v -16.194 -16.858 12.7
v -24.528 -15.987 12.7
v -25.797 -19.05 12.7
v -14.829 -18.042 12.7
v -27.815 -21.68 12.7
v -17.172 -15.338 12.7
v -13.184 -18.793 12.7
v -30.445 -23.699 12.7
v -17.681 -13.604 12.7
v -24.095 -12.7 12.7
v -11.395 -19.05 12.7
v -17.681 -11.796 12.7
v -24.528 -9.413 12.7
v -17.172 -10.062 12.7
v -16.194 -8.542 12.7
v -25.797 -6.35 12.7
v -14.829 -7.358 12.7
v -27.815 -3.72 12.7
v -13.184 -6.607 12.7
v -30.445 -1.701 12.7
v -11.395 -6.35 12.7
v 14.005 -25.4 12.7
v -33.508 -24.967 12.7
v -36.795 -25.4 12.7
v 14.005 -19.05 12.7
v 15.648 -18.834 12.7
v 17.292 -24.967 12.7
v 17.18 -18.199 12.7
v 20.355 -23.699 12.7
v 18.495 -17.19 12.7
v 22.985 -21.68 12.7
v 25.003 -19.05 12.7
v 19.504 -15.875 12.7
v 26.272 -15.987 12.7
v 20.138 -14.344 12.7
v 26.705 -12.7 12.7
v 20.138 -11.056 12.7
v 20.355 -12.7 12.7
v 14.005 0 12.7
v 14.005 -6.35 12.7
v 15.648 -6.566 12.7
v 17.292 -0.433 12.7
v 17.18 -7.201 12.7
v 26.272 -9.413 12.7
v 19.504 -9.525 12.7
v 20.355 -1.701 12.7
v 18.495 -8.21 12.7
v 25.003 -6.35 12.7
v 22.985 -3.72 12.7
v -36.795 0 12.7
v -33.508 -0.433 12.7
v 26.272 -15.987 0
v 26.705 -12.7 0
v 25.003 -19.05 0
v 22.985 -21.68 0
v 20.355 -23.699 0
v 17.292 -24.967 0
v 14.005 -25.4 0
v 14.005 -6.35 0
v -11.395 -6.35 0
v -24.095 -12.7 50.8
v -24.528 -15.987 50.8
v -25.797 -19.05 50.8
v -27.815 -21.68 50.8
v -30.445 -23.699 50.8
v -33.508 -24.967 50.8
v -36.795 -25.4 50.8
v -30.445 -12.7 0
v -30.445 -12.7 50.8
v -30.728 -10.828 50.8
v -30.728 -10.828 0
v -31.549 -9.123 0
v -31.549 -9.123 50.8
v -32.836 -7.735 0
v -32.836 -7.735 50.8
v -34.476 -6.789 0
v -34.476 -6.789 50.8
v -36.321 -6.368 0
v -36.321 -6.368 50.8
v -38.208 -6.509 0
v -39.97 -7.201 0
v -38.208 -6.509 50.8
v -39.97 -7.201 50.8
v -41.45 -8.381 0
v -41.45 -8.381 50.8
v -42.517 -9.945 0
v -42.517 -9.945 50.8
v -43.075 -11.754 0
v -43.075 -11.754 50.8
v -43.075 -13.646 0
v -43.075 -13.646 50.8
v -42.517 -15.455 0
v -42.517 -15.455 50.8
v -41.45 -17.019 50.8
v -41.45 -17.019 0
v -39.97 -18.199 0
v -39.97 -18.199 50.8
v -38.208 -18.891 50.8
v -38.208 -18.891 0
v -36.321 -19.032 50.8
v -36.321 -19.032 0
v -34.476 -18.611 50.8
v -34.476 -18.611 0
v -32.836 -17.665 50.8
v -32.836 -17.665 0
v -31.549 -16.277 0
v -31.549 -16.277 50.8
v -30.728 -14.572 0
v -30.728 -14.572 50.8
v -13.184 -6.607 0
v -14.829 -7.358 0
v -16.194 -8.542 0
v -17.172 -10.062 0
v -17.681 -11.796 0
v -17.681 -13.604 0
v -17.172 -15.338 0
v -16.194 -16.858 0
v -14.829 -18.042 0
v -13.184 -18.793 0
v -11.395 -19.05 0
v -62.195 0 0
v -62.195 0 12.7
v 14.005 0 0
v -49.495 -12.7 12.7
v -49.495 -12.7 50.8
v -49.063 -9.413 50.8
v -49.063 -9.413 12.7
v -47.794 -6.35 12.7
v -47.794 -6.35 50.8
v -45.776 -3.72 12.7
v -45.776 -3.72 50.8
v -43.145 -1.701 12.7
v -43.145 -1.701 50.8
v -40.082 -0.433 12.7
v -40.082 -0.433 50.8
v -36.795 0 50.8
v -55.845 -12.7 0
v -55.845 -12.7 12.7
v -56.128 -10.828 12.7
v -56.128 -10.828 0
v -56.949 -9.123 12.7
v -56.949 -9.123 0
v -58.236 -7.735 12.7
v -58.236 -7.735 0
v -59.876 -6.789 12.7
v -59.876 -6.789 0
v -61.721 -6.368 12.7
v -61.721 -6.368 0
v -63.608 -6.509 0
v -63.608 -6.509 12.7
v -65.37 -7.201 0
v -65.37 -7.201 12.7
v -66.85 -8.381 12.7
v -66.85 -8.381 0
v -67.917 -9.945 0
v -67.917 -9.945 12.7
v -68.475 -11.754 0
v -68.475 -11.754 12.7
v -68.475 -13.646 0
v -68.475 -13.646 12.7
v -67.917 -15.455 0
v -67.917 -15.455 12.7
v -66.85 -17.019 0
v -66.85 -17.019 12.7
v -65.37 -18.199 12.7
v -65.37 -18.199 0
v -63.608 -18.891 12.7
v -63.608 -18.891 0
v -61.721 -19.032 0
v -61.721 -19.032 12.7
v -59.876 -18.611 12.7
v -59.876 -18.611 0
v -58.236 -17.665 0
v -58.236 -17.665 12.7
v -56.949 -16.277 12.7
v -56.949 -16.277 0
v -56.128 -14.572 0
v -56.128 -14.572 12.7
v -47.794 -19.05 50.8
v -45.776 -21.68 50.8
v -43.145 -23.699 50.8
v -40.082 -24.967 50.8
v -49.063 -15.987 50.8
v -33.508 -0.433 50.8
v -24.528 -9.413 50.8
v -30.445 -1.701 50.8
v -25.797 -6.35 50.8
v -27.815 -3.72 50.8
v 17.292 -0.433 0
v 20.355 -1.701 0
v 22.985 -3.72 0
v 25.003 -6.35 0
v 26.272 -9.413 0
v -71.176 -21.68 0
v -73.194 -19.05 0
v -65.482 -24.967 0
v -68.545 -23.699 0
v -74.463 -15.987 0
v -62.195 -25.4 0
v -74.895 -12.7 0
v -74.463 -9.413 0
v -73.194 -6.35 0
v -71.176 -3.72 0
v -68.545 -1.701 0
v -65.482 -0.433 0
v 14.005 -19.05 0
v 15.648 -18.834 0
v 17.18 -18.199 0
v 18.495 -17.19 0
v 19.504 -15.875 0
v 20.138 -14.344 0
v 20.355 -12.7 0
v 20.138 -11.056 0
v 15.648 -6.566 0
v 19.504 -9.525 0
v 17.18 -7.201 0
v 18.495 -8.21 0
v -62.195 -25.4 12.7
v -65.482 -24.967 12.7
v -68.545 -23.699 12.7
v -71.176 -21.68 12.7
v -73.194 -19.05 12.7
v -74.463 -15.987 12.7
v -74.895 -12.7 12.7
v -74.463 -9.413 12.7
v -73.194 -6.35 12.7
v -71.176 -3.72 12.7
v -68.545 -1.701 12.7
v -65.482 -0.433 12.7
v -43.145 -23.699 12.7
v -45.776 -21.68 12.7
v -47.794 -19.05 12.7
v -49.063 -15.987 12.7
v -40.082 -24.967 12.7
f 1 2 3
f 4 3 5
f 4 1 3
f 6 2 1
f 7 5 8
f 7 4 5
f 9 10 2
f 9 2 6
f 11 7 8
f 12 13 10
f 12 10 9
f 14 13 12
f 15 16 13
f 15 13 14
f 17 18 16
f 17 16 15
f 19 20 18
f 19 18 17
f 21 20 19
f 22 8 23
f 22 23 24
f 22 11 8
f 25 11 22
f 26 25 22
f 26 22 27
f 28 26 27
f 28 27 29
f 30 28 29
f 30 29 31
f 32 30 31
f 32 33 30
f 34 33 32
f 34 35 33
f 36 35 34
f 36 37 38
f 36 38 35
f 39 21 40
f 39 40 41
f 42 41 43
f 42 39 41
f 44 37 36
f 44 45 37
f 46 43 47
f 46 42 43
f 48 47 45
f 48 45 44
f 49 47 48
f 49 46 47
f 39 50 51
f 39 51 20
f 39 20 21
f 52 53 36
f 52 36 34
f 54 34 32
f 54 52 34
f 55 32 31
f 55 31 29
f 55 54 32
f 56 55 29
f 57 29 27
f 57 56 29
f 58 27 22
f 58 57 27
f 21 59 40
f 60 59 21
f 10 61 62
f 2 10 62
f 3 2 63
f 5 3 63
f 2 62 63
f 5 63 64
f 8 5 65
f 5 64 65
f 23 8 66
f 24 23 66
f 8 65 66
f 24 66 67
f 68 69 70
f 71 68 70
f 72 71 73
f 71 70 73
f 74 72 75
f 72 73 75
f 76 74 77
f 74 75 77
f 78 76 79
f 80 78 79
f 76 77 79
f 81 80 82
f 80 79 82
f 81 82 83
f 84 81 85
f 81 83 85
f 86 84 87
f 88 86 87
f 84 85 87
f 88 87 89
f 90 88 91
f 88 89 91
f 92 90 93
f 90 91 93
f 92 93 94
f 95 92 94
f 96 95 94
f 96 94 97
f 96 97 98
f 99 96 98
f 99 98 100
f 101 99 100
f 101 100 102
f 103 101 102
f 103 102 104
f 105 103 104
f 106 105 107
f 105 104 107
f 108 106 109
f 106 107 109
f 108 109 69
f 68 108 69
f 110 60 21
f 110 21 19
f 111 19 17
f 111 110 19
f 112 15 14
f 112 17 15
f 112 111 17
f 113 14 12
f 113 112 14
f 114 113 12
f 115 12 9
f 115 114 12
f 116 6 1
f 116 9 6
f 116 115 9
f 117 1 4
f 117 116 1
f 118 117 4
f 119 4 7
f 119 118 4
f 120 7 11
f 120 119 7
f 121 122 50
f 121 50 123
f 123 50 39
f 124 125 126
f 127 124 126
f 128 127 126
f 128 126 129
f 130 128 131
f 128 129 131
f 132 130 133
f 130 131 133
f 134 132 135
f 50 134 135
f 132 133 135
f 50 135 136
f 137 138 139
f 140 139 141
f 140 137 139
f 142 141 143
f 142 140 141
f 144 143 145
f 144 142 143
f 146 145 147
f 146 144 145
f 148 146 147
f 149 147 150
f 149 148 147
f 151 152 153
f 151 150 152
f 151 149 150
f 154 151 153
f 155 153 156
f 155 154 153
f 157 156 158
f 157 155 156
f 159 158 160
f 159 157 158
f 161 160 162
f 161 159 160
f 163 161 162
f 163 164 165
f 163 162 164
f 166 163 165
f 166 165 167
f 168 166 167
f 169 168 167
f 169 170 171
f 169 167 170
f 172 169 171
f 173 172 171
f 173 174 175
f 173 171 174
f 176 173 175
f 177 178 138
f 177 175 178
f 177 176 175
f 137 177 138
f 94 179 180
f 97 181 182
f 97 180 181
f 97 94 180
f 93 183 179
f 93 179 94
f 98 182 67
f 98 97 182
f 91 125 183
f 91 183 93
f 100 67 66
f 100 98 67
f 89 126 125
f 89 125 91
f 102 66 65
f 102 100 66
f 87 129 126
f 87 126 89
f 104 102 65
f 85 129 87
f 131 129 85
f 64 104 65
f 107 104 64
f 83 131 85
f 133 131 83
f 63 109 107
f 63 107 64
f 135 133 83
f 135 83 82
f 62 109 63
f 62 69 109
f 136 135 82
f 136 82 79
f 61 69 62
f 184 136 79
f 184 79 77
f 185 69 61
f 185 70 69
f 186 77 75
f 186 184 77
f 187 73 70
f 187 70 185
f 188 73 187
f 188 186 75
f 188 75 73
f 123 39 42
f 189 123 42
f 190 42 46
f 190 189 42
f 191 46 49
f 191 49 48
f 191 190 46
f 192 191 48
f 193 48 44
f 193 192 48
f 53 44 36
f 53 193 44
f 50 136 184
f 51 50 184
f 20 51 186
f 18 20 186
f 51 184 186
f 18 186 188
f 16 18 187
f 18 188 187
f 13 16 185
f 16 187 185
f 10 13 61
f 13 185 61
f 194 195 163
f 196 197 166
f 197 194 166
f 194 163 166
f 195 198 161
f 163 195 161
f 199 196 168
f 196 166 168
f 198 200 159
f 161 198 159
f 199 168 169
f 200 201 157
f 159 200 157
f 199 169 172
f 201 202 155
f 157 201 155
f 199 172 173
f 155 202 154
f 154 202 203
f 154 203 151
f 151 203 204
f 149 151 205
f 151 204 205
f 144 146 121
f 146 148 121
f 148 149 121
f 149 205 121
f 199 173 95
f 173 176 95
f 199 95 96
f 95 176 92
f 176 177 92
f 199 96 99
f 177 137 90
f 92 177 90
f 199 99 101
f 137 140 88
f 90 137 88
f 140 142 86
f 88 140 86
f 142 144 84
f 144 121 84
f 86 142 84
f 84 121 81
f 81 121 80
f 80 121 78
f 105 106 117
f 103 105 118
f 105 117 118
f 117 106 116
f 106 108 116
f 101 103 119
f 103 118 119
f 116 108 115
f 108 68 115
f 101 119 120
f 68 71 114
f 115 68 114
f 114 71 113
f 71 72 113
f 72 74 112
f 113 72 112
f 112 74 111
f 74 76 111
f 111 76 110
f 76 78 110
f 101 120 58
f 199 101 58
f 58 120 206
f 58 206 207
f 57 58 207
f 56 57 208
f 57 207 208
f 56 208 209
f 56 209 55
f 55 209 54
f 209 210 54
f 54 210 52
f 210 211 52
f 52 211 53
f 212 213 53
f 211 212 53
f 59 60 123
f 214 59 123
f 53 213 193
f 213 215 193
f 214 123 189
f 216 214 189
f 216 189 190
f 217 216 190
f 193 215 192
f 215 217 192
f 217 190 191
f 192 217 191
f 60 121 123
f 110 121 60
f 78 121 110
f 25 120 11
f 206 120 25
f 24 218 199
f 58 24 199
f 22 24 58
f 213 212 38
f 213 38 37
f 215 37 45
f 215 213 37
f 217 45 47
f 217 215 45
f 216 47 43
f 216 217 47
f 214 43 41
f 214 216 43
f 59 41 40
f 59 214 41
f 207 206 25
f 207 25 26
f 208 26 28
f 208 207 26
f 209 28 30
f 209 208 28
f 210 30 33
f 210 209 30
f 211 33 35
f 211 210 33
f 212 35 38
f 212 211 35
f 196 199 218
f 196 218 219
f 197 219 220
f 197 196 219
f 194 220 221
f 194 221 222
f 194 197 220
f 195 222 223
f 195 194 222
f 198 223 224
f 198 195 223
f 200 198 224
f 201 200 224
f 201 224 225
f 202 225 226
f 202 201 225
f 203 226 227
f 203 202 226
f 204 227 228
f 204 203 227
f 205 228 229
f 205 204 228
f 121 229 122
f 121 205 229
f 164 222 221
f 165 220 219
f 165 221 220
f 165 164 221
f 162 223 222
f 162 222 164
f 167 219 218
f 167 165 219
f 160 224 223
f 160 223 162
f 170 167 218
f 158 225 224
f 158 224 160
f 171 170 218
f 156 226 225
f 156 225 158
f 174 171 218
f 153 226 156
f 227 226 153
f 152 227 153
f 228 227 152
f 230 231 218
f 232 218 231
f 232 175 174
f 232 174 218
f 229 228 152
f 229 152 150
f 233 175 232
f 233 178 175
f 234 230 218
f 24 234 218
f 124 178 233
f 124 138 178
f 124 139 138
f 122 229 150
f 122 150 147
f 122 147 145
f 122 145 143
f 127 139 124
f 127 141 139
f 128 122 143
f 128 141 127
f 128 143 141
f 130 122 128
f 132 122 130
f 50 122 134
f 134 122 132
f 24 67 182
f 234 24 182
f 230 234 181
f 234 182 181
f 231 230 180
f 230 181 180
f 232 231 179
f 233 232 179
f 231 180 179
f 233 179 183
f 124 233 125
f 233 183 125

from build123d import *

# Parameters (mm, degrees)
F0_W     = 101.6
F0_H     = 50.8
F1_DEPTH = 25.4
F2_W     = 50.8
F2_H     = 38.1
F3_DEPTH = 25.4
F5_DEPTH = 38.1
F6_R     = 6.35
F7_DEPTH = 50.8
F8_R     = 6.35
F9_DEPTH = 25.4


with BuildPart() as f1:
    # F0 (on Front) → F1 (new body)
    with BuildSketch(Plane.XZ):
        with Locations((-24.0954693718, 25.4)):
            Rectangle(F0_W, F0_H)
    extrude(amount=F1_DEPTH)

    # F2 (on face) → F3 (cut)
    with BuildSketch(Plane.XZ.offset(25.4)):
        with Locations((1.3045306282, 31.75)):
            Rectangle(F2_W, F2_H)
    extrude(amount=-F3_DEPTH, mode=Mode.SUBTRACT)

    # F4 (on face) → F5 (cut)
    with BuildSketch(Plane.XY.offset(50.8)):
        Polygon((-49.4954693718, -25.4), (-49.4954693718, -12.7), (-49.4954693718, 0), (-74.8954693718, 0), (-74.8954693718, -25.4), align=None)
        with BuildLine():
            Line((-24.0954693718, -25.4), (-24.0954693718, -12.7))
            ThreePointArc((-24.0954693718, -12.7), (-27.8152132507, -21.6802561211), (-36.7954693718, -25.4))
            Line((-36.7954693718, -25.4), (-24.0954693718, -25.4))
        make_face()
        with BuildLine():
            ThreePointArc((-36.7954693718, 0), (-27.8152132507, -3.7197438789), (-24.0954693718, -12.7))
            Line((-24.0954693718, -12.7), (-24.0954693718, 0))
            Line((-24.0954693718, 0), (-36.7954693718, 0))
        make_face()
        with BuildLine():
            Line((-49.4954693718, -25.4), (-36.7954693718, -25.4))
            ThreePointArc((-36.7954693718, -25.4), (-45.7757254928, -21.6802561211), (-49.4954693718, -12.7))
            Line((-49.4954693718, -12.7), (-49.4954693718, -25.4))
        make_face()
        with BuildLine():
            ThreePointArc((-49.4954693718, -12.7), (-45.7757254928, -3.7197438789), (-36.7954693718, 0))
            Line((-36.7954693718, 0), (-49.4954693718, 0))
            Line((-49.4954693718, 0), (-49.4954693718, -12.7))
        make_face()
    extrude(amount=-F5_DEPTH, mode=Mode.SUBTRACT)

    # F6 (on face) → F7 (cut)
    with BuildSketch(Plane.XY.offset(50.8)):
        with Locations((-36.7954693718, -12.7)):
            Circle(F6_R)
    extrude(amount=-F7_DEPTH, mode=Mode.SUBTRACT)

    # F8 (on Top) → F9 (cut)
    with BuildSketch(Plane.XY):
        with Locations((-62.1954693718, -12.7)):
            Circle(F8_R)
        with BuildLine():
            ThreePointArc((-11.3954693718, -19.05), (-6.9053413112, -17.1901280605), (-5.0454693718, -12.7))
            ThreePointArc((-5.0454693718, -12.7), (-6.9053413112, -8.2098719395), (-11.3954693718, -6.35))
            ThreePointArc((-11.3954693718, -6.35), (-17.7454693718, -12.7), (-11.3954693718, -19.05))
        make_face()
        with BuildLine():
            ThreePointArc((-11.3954693718, -6.35), (-6.9053413112, -8.2098719395), (-5.0454693718, -12.7))
            ThreePointArc((-5.0454693718, -12.7), (-6.9053413112, -17.1901280605), (-11.3954693718, -19.05))
            Line((-11.3954693718, -19.05), (14.0045306282, -19.05))
            ThreePointArc((14.0045306282, -19.05), (7.6545306282, -12.7), (14.0045306282, -6.35))
            Line((14.0045306282, -6.35), (-11.3954693718, -6.35))
        make_face()
        with BuildLine():
            ThreePointArc((20.3545306282, -12.7), (18.4946586888, -8.2098719395), (14.0045306282, -6.35))
            ThreePointArc((14.0045306282, -6.35), (7.6545306282, -12.7), (14.0045306282, -19.05))
            ThreePointArc((14.0045306282, -19.05), (18.4946586888, -17.1901280605), (20.3545306282, -12.7))
        make_face()
        with BuildLine():
            Line((-74.8954693718, 0), (-74.8954693718, -12.7))
            ThreePointArc((-74.8954693718, -12.7), (-71.1757254928, -3.7197438789), (-62.1954693718, 0))
            Line((-62.1954693718, 0), (-74.8954693718, 0))
        make_face()
        with BuildLine():
            ThreePointArc((-62.1954693718, -25.4), (-71.1757254928, -21.6802561211), (-74.8954693718, -12.7))
            Line((-74.8954693718, -12.7), (-74.8954693718, -25.4))
            Line((-74.8954693718, -25.4), (-62.1954693718, -25.4))
        make_face()
        with BuildLine():
            Line((26.7045306282, -25.4), (26.7045306282, -12.7))
            ThreePointArc((26.7045306282, -12.7), (22.9847867493, -21.6802561211), (14.0045306282, -25.4))
            Line((14.0045306282, -25.4), (26.7045306282, -25.4))
        make_face()
        with BuildLine():
            ThreePointArc((14.0045306282, 0), (22.9847867493, -3.7197438789), (26.7045306282, -12.7))
            Line((26.7045306282, -12.7), (26.7045306282, 0))
            Line((26.7045306282, 0), (14.0045306282, 0))
        make_face()
    extrude(amount=F9_DEPTH, mode=Mode.SUBTRACT)


solid = f1.part
